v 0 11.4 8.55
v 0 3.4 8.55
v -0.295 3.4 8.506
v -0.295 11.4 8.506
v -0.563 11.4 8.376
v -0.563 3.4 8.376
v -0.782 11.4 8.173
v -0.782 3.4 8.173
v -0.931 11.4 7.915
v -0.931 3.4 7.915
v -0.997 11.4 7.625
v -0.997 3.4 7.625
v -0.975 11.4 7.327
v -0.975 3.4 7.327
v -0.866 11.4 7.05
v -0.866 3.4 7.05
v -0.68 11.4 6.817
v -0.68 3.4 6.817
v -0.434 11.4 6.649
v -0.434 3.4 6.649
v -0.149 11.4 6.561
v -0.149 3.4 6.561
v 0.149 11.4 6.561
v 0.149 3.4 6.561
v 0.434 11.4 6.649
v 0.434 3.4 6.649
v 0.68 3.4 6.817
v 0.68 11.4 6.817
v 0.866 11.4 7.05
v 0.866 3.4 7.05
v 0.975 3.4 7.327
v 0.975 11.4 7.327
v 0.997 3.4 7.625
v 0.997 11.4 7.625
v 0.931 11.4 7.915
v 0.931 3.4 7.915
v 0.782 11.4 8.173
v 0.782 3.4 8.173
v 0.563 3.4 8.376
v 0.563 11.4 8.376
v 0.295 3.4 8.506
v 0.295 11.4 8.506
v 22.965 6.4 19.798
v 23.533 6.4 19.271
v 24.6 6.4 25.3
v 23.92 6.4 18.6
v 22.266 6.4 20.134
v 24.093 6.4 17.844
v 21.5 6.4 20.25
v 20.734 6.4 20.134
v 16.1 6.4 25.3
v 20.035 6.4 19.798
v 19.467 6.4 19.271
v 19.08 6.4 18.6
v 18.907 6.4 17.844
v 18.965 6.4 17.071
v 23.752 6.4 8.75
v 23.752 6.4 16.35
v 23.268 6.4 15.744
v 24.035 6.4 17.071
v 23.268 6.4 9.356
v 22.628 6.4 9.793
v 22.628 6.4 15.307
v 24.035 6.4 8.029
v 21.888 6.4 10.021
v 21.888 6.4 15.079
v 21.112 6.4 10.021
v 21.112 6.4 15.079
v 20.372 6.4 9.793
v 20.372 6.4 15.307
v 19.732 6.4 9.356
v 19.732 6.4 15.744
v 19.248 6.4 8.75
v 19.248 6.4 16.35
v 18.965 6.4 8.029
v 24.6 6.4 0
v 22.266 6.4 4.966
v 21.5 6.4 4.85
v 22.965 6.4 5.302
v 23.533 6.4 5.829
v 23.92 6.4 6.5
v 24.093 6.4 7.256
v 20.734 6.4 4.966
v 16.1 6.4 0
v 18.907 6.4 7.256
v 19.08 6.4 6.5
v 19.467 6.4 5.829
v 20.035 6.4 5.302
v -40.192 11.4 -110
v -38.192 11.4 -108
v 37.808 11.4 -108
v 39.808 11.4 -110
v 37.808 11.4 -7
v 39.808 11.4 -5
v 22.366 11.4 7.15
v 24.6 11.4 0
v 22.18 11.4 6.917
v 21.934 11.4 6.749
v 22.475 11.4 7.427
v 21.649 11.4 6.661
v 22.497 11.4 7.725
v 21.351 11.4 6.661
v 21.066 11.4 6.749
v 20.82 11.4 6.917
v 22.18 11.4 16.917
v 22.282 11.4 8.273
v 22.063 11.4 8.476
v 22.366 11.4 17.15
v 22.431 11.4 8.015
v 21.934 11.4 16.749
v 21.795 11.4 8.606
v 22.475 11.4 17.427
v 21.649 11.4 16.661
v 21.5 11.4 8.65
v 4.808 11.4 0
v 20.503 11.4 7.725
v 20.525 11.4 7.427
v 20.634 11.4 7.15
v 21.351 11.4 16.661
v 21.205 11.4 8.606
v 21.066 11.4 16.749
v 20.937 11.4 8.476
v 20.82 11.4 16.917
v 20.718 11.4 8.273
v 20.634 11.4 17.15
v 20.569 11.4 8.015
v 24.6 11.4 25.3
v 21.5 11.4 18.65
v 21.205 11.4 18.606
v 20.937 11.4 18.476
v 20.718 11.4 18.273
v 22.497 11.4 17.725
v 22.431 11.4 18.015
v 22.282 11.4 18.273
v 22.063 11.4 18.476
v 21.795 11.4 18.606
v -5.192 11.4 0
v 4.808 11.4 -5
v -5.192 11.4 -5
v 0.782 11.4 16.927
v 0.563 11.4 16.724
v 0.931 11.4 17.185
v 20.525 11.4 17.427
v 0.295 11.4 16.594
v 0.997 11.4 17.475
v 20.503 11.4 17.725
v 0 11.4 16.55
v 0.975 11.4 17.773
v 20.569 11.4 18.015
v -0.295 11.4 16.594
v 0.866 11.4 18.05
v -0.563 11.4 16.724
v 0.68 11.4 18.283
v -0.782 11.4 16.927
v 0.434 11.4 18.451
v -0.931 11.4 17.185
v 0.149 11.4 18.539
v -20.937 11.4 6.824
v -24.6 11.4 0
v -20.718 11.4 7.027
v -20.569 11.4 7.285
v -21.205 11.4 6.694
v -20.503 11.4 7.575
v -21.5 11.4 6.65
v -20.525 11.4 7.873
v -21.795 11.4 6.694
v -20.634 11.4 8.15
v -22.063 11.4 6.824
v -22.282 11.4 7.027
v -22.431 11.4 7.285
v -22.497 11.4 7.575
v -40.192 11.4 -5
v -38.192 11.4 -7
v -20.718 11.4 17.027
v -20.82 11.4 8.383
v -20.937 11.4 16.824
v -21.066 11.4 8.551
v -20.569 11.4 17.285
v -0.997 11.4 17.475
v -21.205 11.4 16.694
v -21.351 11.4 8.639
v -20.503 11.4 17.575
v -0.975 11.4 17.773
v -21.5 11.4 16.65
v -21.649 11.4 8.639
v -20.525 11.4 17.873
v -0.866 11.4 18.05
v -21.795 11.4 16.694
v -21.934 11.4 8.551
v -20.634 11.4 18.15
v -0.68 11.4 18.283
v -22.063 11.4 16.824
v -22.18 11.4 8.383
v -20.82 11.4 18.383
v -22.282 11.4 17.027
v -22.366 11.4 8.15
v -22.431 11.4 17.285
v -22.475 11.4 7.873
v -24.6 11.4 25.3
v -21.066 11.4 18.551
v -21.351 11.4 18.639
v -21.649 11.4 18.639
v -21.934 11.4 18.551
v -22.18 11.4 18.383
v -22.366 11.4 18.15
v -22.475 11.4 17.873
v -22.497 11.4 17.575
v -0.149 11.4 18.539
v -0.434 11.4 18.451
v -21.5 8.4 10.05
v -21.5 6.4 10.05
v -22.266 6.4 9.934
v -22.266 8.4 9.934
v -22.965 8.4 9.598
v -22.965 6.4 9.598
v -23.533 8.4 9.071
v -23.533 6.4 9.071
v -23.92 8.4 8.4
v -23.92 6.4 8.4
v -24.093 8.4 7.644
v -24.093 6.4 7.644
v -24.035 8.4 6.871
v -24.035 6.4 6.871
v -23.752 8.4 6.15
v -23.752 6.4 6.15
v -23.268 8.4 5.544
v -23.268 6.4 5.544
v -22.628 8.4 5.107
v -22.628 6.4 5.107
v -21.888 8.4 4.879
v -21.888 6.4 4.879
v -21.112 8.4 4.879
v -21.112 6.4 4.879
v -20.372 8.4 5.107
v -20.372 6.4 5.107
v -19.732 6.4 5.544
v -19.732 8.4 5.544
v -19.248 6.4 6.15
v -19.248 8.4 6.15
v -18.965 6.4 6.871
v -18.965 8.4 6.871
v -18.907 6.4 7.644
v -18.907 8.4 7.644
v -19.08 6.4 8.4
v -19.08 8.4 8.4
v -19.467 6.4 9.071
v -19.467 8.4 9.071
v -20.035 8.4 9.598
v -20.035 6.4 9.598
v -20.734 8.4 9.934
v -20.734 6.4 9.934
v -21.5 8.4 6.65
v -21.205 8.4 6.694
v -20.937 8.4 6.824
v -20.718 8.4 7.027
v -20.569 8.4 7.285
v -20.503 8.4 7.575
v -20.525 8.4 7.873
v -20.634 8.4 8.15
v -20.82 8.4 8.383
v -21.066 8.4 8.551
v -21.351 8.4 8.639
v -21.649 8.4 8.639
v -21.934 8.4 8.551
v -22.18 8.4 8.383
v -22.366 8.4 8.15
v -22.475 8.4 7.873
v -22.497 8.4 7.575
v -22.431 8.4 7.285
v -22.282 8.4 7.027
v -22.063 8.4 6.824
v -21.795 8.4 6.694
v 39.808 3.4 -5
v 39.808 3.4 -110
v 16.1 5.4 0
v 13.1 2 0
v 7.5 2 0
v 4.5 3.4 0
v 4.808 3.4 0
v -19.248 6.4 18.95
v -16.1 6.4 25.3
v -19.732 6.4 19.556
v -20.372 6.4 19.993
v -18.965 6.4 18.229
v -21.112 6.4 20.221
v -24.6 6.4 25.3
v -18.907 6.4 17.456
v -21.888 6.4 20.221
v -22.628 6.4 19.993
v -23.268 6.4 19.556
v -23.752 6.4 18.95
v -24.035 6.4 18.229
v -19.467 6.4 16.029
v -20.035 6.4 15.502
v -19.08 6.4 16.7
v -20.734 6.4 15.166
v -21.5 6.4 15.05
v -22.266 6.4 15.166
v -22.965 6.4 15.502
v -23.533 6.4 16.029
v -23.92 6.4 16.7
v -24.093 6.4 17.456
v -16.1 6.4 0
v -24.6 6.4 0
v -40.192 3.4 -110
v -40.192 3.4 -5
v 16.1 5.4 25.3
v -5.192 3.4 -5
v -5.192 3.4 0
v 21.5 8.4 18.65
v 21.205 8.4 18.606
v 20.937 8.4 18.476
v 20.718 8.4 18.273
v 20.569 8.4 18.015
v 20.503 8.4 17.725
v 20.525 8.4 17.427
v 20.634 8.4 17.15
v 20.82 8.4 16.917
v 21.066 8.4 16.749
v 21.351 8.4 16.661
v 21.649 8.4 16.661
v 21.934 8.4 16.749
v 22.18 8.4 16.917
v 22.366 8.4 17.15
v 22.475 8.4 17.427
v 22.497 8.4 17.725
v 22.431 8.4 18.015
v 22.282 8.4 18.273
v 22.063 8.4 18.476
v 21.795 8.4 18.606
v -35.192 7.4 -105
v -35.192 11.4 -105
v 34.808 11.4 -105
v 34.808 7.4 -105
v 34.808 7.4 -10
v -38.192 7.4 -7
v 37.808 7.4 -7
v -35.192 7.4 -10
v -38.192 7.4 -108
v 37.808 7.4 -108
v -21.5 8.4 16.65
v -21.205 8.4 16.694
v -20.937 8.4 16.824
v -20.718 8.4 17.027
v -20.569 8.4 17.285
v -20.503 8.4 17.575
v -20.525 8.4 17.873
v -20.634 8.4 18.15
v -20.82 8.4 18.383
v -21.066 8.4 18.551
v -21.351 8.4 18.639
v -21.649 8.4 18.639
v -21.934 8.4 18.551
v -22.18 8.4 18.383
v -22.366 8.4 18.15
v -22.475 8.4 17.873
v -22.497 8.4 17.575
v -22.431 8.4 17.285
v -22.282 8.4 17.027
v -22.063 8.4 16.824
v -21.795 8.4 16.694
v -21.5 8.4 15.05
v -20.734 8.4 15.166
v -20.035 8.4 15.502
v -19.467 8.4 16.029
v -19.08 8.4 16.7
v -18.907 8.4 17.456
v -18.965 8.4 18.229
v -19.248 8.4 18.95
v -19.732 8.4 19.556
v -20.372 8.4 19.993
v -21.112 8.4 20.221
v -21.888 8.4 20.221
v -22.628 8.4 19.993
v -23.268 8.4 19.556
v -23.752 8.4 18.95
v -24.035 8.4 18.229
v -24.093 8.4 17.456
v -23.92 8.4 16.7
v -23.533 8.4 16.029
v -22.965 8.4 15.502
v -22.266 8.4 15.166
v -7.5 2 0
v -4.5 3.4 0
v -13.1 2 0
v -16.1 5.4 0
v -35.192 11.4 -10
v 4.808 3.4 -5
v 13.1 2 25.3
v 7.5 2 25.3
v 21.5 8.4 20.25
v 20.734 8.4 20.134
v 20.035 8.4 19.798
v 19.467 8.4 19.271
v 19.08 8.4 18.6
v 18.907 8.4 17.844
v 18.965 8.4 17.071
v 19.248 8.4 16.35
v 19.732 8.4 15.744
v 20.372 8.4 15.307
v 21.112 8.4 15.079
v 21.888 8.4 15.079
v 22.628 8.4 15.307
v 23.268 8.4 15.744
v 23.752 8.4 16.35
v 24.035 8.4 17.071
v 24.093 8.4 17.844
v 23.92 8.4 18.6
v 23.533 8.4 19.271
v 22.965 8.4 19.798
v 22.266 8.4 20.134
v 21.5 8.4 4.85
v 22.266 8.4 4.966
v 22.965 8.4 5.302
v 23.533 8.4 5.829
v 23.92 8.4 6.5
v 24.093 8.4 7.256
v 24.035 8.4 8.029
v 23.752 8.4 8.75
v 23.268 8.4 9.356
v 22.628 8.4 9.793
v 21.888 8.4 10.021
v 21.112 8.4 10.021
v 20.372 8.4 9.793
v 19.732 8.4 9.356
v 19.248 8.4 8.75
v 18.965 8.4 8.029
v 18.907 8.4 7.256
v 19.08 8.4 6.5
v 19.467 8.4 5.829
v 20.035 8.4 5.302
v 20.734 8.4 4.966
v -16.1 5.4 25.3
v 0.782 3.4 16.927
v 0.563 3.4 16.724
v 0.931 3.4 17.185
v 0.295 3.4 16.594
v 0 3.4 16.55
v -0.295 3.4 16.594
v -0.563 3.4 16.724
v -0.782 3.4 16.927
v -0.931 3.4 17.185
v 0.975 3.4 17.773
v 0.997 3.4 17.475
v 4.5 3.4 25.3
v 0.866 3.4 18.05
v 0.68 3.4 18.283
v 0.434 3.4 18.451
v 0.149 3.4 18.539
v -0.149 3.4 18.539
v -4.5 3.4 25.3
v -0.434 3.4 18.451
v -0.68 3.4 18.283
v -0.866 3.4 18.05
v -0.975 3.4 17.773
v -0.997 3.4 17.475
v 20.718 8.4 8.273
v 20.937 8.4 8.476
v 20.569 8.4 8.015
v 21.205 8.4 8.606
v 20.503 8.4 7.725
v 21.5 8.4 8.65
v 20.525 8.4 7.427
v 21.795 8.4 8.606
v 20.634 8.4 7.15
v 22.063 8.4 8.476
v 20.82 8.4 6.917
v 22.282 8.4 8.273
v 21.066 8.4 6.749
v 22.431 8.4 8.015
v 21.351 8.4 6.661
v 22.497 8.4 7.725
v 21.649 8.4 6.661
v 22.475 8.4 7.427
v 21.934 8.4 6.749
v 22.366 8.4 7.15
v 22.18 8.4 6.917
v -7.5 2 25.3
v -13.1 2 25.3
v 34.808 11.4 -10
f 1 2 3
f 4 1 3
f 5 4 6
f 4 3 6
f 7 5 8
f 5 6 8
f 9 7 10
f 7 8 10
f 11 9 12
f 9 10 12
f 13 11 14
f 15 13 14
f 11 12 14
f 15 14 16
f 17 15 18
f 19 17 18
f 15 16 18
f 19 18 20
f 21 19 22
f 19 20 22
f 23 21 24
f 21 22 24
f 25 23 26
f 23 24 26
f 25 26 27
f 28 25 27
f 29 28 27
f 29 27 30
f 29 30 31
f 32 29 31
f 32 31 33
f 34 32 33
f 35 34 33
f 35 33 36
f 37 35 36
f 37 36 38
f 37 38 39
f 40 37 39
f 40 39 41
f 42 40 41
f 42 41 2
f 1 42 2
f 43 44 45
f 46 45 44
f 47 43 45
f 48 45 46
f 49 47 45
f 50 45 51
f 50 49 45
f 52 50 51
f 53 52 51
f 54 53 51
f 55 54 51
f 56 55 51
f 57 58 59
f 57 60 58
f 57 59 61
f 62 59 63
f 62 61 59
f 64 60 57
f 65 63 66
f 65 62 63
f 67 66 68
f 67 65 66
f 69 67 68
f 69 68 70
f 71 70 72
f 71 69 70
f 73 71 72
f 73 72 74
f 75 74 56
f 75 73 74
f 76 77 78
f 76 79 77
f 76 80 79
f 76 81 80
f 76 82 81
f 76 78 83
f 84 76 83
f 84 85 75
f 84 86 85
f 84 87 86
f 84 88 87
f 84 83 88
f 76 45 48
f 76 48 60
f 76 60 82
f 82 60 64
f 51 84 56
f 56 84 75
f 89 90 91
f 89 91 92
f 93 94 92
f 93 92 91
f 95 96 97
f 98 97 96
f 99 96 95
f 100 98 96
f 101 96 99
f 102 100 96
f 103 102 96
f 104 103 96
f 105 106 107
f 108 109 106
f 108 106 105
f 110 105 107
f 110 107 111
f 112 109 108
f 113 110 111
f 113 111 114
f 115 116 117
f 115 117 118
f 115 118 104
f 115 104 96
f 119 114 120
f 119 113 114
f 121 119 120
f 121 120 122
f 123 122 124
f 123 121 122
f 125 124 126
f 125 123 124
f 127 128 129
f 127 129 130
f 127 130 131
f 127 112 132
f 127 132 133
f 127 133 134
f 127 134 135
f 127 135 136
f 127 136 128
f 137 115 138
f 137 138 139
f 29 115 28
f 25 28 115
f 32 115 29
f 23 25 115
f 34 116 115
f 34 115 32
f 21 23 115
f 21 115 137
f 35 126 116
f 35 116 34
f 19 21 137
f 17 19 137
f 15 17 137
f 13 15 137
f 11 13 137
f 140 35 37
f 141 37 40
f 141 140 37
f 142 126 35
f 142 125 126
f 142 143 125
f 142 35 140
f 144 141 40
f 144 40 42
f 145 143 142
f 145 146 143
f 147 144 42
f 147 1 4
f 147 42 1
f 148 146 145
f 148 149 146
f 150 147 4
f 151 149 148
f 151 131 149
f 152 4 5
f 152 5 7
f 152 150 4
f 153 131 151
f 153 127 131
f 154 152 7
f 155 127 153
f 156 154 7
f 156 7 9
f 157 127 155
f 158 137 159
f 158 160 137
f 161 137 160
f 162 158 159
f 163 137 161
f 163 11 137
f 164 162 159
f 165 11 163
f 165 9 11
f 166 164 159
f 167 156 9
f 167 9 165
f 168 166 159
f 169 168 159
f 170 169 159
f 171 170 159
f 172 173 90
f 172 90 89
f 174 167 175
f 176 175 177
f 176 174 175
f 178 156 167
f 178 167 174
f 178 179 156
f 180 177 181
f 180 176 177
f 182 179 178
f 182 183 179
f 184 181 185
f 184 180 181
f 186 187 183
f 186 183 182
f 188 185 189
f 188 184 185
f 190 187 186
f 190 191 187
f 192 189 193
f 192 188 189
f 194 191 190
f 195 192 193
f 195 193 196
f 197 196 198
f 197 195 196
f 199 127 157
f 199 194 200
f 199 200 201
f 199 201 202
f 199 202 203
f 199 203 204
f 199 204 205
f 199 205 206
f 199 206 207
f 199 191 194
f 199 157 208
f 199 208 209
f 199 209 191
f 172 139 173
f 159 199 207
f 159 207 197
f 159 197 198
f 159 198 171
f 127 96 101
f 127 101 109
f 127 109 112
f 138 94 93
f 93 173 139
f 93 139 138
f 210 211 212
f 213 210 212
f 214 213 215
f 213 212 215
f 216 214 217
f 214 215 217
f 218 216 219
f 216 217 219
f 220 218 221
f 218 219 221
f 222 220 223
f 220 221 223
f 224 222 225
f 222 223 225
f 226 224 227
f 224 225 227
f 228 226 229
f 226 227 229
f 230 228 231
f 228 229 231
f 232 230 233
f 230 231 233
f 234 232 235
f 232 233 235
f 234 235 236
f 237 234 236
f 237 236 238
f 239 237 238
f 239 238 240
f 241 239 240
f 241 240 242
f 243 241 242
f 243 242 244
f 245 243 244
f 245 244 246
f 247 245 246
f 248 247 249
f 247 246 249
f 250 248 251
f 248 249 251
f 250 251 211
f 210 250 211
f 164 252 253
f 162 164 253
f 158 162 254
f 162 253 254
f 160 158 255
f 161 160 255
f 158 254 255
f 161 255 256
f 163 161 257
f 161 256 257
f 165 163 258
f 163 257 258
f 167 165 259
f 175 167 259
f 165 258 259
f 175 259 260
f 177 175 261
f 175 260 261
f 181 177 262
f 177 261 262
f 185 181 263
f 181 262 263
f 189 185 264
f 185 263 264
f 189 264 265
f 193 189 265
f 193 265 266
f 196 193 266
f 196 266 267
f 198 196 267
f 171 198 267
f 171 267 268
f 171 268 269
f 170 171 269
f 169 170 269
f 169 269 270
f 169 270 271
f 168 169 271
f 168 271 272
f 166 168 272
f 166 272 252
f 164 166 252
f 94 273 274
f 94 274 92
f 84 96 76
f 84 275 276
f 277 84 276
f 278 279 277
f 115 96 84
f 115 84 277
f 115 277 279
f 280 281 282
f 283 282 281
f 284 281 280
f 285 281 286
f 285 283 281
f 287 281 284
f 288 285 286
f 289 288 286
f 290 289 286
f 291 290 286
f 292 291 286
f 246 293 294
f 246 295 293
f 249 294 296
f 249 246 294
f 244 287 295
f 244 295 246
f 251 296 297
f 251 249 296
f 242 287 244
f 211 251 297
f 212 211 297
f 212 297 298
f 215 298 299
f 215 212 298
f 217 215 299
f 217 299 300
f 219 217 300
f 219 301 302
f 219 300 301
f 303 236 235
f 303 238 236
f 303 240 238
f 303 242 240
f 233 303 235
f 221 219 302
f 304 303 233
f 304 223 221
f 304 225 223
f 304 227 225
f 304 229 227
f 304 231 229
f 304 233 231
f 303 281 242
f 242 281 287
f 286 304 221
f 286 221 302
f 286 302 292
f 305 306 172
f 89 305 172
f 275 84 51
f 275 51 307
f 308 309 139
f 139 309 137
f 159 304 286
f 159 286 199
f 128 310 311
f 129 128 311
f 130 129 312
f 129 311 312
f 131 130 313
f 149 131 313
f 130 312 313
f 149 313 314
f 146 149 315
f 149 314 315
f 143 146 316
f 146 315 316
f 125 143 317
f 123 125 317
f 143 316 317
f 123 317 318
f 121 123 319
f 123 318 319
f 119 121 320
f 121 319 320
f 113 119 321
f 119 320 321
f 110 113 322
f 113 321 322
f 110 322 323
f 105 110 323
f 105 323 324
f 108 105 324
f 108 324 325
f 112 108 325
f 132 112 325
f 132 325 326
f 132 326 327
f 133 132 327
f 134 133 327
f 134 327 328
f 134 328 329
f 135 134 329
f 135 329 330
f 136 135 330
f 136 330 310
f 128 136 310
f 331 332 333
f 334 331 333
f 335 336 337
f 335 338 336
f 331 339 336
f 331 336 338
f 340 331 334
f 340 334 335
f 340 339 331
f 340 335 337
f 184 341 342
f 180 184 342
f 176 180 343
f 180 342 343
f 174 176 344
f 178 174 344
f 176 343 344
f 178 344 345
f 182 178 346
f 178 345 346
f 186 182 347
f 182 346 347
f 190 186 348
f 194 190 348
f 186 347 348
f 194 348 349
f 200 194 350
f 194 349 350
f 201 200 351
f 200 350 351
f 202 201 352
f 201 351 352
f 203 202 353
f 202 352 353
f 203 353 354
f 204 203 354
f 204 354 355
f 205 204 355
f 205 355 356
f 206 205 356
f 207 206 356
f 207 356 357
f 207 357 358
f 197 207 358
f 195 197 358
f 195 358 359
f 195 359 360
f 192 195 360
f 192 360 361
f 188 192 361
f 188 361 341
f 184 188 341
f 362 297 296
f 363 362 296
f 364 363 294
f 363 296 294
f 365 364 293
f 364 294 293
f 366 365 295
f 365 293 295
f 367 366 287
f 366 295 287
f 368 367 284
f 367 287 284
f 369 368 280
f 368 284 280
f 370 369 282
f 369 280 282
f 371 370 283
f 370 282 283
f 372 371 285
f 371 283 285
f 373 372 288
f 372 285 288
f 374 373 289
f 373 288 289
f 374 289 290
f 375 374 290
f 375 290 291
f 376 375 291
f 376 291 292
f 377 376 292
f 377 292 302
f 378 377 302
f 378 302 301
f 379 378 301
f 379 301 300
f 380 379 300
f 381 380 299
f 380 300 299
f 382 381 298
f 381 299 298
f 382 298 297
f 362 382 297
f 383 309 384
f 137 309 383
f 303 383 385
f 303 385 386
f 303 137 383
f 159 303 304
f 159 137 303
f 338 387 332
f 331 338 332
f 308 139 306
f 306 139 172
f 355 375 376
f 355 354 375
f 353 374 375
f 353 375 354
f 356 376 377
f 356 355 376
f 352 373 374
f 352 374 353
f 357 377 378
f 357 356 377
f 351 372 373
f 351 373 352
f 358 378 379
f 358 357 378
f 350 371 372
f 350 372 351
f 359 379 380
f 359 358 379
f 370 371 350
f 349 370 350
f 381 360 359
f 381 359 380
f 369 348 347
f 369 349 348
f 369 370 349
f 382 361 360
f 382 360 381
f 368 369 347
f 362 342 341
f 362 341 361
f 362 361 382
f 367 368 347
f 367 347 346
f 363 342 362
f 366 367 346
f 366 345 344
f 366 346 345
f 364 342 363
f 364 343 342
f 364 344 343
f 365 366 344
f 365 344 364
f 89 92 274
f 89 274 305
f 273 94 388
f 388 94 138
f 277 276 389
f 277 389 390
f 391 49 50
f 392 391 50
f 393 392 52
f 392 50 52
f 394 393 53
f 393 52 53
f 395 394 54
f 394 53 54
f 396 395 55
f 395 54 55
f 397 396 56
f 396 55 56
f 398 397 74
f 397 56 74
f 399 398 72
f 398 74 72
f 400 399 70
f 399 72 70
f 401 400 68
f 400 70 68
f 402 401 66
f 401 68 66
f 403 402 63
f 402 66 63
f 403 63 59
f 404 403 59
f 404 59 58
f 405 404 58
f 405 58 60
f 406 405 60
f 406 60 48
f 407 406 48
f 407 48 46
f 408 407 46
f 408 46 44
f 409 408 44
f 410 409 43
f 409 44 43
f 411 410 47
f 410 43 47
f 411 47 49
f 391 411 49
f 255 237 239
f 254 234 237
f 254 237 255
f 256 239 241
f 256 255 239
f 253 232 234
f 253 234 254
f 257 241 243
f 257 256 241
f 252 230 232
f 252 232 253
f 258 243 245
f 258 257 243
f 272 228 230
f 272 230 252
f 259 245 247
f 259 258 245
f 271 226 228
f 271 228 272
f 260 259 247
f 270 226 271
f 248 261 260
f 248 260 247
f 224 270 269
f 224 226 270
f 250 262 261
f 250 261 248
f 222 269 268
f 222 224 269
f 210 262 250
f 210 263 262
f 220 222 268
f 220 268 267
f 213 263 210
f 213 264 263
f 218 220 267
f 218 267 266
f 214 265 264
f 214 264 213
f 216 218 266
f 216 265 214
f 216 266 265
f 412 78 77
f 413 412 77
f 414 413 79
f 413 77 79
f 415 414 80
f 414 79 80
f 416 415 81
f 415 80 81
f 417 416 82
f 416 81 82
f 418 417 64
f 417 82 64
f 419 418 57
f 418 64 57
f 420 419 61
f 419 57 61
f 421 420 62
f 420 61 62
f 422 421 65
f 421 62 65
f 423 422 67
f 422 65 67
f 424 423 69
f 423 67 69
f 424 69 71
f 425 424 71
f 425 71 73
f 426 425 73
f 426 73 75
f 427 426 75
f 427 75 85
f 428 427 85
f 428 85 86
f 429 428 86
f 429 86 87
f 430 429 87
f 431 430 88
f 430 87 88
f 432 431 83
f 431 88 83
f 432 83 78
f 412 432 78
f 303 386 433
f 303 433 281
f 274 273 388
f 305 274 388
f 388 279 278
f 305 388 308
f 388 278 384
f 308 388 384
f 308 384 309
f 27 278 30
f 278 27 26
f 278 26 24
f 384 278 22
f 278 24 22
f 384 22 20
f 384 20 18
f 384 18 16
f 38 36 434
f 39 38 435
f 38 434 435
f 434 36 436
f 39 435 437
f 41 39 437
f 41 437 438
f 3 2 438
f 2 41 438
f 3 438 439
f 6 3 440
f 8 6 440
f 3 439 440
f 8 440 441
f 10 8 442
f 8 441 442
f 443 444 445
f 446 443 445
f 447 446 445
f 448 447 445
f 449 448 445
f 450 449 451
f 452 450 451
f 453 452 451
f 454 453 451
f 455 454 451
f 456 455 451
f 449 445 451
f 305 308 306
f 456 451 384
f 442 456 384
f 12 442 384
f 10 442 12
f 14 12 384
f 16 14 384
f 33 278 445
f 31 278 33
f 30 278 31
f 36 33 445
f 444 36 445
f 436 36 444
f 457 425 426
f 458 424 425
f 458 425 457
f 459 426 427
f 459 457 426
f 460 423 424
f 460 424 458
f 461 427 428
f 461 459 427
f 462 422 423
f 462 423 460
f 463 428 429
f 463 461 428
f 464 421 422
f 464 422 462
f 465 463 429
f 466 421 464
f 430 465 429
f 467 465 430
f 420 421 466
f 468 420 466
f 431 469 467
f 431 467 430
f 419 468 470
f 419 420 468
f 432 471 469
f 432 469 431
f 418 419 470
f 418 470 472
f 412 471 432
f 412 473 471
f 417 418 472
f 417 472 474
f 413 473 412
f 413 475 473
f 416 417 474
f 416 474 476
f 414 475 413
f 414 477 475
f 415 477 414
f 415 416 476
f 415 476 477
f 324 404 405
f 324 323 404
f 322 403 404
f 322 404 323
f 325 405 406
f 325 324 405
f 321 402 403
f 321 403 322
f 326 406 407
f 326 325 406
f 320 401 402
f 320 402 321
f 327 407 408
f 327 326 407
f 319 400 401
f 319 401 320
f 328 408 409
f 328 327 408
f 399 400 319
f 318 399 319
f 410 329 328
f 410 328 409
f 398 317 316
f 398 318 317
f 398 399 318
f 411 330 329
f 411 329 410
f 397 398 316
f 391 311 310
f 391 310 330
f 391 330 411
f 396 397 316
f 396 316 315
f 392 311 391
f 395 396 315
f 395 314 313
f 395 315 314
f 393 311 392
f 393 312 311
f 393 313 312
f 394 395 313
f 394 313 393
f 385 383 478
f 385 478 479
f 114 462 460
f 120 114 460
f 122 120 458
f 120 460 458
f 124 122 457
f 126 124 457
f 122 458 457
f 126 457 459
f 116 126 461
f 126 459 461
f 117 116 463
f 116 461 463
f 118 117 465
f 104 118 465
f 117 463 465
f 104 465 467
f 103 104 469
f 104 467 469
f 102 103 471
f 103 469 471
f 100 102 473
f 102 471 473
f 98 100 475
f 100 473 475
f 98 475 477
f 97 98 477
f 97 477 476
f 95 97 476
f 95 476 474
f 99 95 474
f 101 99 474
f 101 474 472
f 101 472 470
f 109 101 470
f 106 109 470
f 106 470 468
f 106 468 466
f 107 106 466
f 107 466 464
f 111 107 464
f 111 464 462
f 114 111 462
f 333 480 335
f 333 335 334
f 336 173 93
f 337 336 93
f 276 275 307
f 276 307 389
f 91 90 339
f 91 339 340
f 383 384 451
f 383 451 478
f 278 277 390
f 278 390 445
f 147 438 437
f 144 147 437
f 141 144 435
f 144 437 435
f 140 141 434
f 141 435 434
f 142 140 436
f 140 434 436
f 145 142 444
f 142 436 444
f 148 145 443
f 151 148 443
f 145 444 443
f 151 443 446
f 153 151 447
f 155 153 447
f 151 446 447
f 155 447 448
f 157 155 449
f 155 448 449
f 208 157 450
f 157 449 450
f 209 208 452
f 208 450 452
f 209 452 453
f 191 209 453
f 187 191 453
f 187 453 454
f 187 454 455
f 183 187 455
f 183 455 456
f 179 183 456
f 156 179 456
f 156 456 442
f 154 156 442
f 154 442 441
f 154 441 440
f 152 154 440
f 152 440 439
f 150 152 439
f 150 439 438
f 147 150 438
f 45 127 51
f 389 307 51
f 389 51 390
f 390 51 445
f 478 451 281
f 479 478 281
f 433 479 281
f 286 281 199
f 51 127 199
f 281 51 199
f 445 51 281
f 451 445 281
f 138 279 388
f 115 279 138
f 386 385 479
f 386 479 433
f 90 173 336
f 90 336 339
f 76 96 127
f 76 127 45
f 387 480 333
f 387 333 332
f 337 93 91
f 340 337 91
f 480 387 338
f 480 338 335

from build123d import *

# Parameters (mm, degrees)
BOSS_EXTRUDE2_DEPTH = 25.3
SKETCH3_R           = 1
CUT_EXTRUDE1_DEPTH  = 37.183559803
SKETCH4_R           = 1
CUT_EXTRUDE2_DEPTH  = 36.640566774
SKETCH5_R           = 2.6
CUT_EXTRUDE3_DEPTH  = 2
SKETCH7_W           = 10
SKETCH7_H           = 8
BOSS_EXTRUDE4_DEPTH = 5
SKETCH8_W           = 80
SKETCH8_H           = 8
BOSS_EXTRUDE5_DEPTH = 105
SKETCH9_W           = 76
SKETCH9_H           = 101
SKETCH9_W_2         = 70
SKETCH9_H_2         = 95
CUT_EXTRUDE4_DEPTH  = 4


with BuildPart() as part:
    # Sketch2 → Boss-Extrude2 (new body)
    with BuildSketch(Plane.XY):
        Polygon((4.5, 3.4), (-4.5, 3.4), (-7.5, 2), (-13.1, 2), (-16.1, 5.4), (-16.1, 6.4), (-24.6, 6.4), (-24.6, 11.4), (24.6, 11.4), (24.6, 6.4), (16.1, 6.4), (16.1, 5.4), (13.1, 2), (7.5, 2), align=None)
    extrude(amount=BOSS_EXTRUDE2_DEPTH)

    # Sketch3 → Cut-Extrude1 (cut, through all)
    with BuildSketch(Plane.XZ.offset(-3.4)):
        with Locations(Location((0, 17.55, 0), (0, 0, 270))):
            Circle(SKETCH3_R)
        with Locations(Location((0, 7.55, 0), (0, 0, 90))):
            Circle(SKETCH3_R)
    extrude(amount=-CUT_EXTRUDE1_DEPTH, mode=Mode.SUBTRACT)

    # Sketch4 → Cut-Extrude2 (cut, through all)
    with BuildSketch(Plane.XZ.offset(-6.4)):
        with Locations(Location((-21.5, 17.65, 0), (0, 0, 270))):
            Circle(SKETCH4_R)
        with Locations(Location((21.5, 17.65, 0), (0, 0, 90))):
            Circle(SKETCH4_R)
        with Locations(Location((-21.5, 7.65, 0), (0, 0, 270))):
            Circle(SKETCH4_R)
        with Locations(Location((21.5, 7.65, 0), (0, 0, 90))):
            Circle(SKETCH4_R)
    extrude(amount=-CUT_EXTRUDE2_DEPTH, mode=Mode.SUBTRACT)

    # Sketch5 → Cut-Extrude3 (cut)
    with BuildSketch(Plane.XZ.offset(-6.4)):
        with Locations(Location((-21.5, 17.65, 0), (0, 0, 270))):
            Circle(SKETCH5_R)
        with Locations(Location((-21.5, 7.45, 0), (0, 0, 90))):
            Circle(SKETCH5_R)
        with Locations(Location((21.5, 7.45, 0), (0, 0, 270))):
            Circle(SKETCH5_R)
        with Locations(Location((21.5, 17.65, 0), (0, 0, 90))):
            Circle(SKETCH5_R)
    extrude(amount=-CUT_EXTRUDE3_DEPTH, mode=Mode.SUBTRACT)

    # Sketch7 → Boss-Extrude4 (add)
    with BuildSketch(Plane(origin=(0, 0, 0), x_dir=(-1, 0, 0), z_dir=(0, 0, -1))):
        with Locations((0.191701822, 7.4)):
            Rectangle(SKETCH7_W, SKETCH7_H)
    extrude(amount=BOSS_EXTRUDE4_DEPTH)

    # Sketch8 → Boss-Extrude5 (add)
    with BuildSketch(Plane(origin=(0, 0, -5), x_dir=(-1, 0, 0), z_dir=(0, 0, -1))):
        with Locations((0.191701822, 7.4)):
            Rectangle(SKETCH8_W, SKETCH8_H)
    extrude(amount=BOSS_EXTRUDE5_DEPTH)

    # Sketch9 → Cut-Extrude4 (cut)
    with BuildSketch(Plane(origin=(0, 11.4, 0), x_dir=(1, 0, 0), z_dir=(0, 1, 0))):
        with Locations((-0.191701822, 57.5)):
            Rectangle(SKETCH9_W, SKETCH9_H)
        with Locations((-0.191701822, 57.5)):
            Rectangle(SKETCH9_W_2, SKETCH9_H_2, mode=Mode.SUBTRACT)
    extrude(amount=-CUT_EXTRUDE4_DEPTH, mode=Mode.SUBTRACT)


solid = part.part
